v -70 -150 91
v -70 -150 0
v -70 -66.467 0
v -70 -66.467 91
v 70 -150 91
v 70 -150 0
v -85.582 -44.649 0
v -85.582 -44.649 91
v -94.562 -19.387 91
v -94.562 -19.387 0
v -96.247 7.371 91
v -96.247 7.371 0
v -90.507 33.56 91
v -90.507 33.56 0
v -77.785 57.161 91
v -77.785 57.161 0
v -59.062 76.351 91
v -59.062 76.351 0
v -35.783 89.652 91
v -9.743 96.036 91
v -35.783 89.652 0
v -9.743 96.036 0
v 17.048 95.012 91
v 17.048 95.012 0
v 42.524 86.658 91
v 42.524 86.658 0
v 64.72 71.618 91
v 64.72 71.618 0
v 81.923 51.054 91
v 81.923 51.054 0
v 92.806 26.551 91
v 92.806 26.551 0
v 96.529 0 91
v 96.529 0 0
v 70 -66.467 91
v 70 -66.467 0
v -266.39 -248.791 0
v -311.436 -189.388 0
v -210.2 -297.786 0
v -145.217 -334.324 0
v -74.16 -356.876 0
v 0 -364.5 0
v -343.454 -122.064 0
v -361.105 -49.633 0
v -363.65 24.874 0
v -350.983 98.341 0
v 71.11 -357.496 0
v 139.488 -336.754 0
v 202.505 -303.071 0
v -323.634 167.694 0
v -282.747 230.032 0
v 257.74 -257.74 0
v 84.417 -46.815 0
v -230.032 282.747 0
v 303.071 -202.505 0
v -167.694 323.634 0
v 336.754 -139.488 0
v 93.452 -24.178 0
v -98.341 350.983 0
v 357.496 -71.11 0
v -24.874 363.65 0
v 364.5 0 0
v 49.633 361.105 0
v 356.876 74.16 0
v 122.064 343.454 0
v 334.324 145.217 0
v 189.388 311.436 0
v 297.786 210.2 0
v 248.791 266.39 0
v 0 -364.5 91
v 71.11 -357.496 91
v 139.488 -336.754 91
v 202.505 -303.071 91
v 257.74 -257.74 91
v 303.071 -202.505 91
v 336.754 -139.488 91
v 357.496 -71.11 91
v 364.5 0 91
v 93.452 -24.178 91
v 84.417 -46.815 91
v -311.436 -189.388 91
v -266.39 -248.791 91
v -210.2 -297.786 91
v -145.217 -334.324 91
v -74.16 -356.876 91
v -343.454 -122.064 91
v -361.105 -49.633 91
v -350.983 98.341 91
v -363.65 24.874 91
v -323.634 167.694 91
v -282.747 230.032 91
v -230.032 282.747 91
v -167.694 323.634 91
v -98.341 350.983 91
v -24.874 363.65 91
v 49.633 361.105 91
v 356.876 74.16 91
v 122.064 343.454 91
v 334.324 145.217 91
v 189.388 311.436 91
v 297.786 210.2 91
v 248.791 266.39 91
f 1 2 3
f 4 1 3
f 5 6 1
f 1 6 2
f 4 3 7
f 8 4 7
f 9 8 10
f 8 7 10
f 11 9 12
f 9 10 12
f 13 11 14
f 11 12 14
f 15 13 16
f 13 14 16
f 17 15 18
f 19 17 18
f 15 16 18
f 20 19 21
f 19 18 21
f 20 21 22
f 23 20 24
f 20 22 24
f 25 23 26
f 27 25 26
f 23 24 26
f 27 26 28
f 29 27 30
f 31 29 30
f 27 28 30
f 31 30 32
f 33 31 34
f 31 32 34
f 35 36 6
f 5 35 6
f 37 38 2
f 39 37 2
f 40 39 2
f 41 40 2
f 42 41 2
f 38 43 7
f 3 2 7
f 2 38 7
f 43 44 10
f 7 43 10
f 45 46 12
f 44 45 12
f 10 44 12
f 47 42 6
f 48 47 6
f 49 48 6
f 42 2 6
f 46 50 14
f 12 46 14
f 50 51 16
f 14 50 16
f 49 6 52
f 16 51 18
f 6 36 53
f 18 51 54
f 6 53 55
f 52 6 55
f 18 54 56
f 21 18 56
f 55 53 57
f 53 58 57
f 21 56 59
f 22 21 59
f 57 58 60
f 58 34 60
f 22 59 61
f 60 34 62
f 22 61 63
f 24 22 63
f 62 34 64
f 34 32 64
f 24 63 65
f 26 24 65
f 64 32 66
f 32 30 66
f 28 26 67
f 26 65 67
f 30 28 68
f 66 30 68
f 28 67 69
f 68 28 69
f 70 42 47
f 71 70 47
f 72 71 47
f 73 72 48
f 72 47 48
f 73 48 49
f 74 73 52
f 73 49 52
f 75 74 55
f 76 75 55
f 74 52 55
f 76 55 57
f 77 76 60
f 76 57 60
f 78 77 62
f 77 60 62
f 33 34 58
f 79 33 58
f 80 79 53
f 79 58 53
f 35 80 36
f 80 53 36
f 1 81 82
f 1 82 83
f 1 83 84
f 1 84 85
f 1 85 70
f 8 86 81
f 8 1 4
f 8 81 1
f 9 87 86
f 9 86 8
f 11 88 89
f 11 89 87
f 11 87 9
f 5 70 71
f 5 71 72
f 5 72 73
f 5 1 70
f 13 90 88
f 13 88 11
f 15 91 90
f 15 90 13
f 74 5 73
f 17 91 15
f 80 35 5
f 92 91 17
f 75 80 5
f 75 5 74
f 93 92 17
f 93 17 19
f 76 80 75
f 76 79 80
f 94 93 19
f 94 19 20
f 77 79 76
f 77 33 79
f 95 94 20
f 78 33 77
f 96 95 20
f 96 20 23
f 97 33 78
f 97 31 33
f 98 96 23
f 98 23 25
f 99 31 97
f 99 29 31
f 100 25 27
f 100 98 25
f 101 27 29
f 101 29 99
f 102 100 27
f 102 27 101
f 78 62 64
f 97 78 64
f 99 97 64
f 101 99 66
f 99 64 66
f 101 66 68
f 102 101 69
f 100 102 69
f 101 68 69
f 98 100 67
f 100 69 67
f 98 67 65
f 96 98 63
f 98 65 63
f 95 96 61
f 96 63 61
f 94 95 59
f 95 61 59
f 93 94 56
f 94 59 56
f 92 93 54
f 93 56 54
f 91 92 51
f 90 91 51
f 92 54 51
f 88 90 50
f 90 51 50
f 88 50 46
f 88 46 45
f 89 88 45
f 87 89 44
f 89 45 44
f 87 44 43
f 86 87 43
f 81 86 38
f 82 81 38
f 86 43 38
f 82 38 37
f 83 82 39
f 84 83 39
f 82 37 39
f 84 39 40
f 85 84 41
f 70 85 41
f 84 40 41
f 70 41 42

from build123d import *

# Parameters (mm, degrees)
BOSS_EXTRUDE2_DEPTH = 91


with BuildPart() as part:
    # Sketch1 → Boss-Extrude2 (new body)
    with BuildSketch(Plane.XY):
        with BuildLine():
            ThreePointArc((364.5, 0), (-257.740421742, 257.740421742), (0, -364.5))
            ThreePointArc((0, -364.5), (257.740421742, -257.740421742), (364.5, 0))
        make_face()
        with BuildLine():
            Line((70, -150), (0, -150))
            Line((0, -150), (-70, -150))
            Line((-70, -150), (-70, -66.467106312))
            ThreePointArc((-70, -66.467106312), (-35.78292841, 89.651872573), (96.529147005, 0))
            ThreePointArc((96.529147005, 0), (89.651872573, -35.78292841), (70, -66.467106312))
            Line((70, -66.467106312), (70, -150))
        make_face(mode=Mode.SUBTRACT)
    extrude(amount=BOSS_EXTRUDE2_DEPTH)


solid = part.part
